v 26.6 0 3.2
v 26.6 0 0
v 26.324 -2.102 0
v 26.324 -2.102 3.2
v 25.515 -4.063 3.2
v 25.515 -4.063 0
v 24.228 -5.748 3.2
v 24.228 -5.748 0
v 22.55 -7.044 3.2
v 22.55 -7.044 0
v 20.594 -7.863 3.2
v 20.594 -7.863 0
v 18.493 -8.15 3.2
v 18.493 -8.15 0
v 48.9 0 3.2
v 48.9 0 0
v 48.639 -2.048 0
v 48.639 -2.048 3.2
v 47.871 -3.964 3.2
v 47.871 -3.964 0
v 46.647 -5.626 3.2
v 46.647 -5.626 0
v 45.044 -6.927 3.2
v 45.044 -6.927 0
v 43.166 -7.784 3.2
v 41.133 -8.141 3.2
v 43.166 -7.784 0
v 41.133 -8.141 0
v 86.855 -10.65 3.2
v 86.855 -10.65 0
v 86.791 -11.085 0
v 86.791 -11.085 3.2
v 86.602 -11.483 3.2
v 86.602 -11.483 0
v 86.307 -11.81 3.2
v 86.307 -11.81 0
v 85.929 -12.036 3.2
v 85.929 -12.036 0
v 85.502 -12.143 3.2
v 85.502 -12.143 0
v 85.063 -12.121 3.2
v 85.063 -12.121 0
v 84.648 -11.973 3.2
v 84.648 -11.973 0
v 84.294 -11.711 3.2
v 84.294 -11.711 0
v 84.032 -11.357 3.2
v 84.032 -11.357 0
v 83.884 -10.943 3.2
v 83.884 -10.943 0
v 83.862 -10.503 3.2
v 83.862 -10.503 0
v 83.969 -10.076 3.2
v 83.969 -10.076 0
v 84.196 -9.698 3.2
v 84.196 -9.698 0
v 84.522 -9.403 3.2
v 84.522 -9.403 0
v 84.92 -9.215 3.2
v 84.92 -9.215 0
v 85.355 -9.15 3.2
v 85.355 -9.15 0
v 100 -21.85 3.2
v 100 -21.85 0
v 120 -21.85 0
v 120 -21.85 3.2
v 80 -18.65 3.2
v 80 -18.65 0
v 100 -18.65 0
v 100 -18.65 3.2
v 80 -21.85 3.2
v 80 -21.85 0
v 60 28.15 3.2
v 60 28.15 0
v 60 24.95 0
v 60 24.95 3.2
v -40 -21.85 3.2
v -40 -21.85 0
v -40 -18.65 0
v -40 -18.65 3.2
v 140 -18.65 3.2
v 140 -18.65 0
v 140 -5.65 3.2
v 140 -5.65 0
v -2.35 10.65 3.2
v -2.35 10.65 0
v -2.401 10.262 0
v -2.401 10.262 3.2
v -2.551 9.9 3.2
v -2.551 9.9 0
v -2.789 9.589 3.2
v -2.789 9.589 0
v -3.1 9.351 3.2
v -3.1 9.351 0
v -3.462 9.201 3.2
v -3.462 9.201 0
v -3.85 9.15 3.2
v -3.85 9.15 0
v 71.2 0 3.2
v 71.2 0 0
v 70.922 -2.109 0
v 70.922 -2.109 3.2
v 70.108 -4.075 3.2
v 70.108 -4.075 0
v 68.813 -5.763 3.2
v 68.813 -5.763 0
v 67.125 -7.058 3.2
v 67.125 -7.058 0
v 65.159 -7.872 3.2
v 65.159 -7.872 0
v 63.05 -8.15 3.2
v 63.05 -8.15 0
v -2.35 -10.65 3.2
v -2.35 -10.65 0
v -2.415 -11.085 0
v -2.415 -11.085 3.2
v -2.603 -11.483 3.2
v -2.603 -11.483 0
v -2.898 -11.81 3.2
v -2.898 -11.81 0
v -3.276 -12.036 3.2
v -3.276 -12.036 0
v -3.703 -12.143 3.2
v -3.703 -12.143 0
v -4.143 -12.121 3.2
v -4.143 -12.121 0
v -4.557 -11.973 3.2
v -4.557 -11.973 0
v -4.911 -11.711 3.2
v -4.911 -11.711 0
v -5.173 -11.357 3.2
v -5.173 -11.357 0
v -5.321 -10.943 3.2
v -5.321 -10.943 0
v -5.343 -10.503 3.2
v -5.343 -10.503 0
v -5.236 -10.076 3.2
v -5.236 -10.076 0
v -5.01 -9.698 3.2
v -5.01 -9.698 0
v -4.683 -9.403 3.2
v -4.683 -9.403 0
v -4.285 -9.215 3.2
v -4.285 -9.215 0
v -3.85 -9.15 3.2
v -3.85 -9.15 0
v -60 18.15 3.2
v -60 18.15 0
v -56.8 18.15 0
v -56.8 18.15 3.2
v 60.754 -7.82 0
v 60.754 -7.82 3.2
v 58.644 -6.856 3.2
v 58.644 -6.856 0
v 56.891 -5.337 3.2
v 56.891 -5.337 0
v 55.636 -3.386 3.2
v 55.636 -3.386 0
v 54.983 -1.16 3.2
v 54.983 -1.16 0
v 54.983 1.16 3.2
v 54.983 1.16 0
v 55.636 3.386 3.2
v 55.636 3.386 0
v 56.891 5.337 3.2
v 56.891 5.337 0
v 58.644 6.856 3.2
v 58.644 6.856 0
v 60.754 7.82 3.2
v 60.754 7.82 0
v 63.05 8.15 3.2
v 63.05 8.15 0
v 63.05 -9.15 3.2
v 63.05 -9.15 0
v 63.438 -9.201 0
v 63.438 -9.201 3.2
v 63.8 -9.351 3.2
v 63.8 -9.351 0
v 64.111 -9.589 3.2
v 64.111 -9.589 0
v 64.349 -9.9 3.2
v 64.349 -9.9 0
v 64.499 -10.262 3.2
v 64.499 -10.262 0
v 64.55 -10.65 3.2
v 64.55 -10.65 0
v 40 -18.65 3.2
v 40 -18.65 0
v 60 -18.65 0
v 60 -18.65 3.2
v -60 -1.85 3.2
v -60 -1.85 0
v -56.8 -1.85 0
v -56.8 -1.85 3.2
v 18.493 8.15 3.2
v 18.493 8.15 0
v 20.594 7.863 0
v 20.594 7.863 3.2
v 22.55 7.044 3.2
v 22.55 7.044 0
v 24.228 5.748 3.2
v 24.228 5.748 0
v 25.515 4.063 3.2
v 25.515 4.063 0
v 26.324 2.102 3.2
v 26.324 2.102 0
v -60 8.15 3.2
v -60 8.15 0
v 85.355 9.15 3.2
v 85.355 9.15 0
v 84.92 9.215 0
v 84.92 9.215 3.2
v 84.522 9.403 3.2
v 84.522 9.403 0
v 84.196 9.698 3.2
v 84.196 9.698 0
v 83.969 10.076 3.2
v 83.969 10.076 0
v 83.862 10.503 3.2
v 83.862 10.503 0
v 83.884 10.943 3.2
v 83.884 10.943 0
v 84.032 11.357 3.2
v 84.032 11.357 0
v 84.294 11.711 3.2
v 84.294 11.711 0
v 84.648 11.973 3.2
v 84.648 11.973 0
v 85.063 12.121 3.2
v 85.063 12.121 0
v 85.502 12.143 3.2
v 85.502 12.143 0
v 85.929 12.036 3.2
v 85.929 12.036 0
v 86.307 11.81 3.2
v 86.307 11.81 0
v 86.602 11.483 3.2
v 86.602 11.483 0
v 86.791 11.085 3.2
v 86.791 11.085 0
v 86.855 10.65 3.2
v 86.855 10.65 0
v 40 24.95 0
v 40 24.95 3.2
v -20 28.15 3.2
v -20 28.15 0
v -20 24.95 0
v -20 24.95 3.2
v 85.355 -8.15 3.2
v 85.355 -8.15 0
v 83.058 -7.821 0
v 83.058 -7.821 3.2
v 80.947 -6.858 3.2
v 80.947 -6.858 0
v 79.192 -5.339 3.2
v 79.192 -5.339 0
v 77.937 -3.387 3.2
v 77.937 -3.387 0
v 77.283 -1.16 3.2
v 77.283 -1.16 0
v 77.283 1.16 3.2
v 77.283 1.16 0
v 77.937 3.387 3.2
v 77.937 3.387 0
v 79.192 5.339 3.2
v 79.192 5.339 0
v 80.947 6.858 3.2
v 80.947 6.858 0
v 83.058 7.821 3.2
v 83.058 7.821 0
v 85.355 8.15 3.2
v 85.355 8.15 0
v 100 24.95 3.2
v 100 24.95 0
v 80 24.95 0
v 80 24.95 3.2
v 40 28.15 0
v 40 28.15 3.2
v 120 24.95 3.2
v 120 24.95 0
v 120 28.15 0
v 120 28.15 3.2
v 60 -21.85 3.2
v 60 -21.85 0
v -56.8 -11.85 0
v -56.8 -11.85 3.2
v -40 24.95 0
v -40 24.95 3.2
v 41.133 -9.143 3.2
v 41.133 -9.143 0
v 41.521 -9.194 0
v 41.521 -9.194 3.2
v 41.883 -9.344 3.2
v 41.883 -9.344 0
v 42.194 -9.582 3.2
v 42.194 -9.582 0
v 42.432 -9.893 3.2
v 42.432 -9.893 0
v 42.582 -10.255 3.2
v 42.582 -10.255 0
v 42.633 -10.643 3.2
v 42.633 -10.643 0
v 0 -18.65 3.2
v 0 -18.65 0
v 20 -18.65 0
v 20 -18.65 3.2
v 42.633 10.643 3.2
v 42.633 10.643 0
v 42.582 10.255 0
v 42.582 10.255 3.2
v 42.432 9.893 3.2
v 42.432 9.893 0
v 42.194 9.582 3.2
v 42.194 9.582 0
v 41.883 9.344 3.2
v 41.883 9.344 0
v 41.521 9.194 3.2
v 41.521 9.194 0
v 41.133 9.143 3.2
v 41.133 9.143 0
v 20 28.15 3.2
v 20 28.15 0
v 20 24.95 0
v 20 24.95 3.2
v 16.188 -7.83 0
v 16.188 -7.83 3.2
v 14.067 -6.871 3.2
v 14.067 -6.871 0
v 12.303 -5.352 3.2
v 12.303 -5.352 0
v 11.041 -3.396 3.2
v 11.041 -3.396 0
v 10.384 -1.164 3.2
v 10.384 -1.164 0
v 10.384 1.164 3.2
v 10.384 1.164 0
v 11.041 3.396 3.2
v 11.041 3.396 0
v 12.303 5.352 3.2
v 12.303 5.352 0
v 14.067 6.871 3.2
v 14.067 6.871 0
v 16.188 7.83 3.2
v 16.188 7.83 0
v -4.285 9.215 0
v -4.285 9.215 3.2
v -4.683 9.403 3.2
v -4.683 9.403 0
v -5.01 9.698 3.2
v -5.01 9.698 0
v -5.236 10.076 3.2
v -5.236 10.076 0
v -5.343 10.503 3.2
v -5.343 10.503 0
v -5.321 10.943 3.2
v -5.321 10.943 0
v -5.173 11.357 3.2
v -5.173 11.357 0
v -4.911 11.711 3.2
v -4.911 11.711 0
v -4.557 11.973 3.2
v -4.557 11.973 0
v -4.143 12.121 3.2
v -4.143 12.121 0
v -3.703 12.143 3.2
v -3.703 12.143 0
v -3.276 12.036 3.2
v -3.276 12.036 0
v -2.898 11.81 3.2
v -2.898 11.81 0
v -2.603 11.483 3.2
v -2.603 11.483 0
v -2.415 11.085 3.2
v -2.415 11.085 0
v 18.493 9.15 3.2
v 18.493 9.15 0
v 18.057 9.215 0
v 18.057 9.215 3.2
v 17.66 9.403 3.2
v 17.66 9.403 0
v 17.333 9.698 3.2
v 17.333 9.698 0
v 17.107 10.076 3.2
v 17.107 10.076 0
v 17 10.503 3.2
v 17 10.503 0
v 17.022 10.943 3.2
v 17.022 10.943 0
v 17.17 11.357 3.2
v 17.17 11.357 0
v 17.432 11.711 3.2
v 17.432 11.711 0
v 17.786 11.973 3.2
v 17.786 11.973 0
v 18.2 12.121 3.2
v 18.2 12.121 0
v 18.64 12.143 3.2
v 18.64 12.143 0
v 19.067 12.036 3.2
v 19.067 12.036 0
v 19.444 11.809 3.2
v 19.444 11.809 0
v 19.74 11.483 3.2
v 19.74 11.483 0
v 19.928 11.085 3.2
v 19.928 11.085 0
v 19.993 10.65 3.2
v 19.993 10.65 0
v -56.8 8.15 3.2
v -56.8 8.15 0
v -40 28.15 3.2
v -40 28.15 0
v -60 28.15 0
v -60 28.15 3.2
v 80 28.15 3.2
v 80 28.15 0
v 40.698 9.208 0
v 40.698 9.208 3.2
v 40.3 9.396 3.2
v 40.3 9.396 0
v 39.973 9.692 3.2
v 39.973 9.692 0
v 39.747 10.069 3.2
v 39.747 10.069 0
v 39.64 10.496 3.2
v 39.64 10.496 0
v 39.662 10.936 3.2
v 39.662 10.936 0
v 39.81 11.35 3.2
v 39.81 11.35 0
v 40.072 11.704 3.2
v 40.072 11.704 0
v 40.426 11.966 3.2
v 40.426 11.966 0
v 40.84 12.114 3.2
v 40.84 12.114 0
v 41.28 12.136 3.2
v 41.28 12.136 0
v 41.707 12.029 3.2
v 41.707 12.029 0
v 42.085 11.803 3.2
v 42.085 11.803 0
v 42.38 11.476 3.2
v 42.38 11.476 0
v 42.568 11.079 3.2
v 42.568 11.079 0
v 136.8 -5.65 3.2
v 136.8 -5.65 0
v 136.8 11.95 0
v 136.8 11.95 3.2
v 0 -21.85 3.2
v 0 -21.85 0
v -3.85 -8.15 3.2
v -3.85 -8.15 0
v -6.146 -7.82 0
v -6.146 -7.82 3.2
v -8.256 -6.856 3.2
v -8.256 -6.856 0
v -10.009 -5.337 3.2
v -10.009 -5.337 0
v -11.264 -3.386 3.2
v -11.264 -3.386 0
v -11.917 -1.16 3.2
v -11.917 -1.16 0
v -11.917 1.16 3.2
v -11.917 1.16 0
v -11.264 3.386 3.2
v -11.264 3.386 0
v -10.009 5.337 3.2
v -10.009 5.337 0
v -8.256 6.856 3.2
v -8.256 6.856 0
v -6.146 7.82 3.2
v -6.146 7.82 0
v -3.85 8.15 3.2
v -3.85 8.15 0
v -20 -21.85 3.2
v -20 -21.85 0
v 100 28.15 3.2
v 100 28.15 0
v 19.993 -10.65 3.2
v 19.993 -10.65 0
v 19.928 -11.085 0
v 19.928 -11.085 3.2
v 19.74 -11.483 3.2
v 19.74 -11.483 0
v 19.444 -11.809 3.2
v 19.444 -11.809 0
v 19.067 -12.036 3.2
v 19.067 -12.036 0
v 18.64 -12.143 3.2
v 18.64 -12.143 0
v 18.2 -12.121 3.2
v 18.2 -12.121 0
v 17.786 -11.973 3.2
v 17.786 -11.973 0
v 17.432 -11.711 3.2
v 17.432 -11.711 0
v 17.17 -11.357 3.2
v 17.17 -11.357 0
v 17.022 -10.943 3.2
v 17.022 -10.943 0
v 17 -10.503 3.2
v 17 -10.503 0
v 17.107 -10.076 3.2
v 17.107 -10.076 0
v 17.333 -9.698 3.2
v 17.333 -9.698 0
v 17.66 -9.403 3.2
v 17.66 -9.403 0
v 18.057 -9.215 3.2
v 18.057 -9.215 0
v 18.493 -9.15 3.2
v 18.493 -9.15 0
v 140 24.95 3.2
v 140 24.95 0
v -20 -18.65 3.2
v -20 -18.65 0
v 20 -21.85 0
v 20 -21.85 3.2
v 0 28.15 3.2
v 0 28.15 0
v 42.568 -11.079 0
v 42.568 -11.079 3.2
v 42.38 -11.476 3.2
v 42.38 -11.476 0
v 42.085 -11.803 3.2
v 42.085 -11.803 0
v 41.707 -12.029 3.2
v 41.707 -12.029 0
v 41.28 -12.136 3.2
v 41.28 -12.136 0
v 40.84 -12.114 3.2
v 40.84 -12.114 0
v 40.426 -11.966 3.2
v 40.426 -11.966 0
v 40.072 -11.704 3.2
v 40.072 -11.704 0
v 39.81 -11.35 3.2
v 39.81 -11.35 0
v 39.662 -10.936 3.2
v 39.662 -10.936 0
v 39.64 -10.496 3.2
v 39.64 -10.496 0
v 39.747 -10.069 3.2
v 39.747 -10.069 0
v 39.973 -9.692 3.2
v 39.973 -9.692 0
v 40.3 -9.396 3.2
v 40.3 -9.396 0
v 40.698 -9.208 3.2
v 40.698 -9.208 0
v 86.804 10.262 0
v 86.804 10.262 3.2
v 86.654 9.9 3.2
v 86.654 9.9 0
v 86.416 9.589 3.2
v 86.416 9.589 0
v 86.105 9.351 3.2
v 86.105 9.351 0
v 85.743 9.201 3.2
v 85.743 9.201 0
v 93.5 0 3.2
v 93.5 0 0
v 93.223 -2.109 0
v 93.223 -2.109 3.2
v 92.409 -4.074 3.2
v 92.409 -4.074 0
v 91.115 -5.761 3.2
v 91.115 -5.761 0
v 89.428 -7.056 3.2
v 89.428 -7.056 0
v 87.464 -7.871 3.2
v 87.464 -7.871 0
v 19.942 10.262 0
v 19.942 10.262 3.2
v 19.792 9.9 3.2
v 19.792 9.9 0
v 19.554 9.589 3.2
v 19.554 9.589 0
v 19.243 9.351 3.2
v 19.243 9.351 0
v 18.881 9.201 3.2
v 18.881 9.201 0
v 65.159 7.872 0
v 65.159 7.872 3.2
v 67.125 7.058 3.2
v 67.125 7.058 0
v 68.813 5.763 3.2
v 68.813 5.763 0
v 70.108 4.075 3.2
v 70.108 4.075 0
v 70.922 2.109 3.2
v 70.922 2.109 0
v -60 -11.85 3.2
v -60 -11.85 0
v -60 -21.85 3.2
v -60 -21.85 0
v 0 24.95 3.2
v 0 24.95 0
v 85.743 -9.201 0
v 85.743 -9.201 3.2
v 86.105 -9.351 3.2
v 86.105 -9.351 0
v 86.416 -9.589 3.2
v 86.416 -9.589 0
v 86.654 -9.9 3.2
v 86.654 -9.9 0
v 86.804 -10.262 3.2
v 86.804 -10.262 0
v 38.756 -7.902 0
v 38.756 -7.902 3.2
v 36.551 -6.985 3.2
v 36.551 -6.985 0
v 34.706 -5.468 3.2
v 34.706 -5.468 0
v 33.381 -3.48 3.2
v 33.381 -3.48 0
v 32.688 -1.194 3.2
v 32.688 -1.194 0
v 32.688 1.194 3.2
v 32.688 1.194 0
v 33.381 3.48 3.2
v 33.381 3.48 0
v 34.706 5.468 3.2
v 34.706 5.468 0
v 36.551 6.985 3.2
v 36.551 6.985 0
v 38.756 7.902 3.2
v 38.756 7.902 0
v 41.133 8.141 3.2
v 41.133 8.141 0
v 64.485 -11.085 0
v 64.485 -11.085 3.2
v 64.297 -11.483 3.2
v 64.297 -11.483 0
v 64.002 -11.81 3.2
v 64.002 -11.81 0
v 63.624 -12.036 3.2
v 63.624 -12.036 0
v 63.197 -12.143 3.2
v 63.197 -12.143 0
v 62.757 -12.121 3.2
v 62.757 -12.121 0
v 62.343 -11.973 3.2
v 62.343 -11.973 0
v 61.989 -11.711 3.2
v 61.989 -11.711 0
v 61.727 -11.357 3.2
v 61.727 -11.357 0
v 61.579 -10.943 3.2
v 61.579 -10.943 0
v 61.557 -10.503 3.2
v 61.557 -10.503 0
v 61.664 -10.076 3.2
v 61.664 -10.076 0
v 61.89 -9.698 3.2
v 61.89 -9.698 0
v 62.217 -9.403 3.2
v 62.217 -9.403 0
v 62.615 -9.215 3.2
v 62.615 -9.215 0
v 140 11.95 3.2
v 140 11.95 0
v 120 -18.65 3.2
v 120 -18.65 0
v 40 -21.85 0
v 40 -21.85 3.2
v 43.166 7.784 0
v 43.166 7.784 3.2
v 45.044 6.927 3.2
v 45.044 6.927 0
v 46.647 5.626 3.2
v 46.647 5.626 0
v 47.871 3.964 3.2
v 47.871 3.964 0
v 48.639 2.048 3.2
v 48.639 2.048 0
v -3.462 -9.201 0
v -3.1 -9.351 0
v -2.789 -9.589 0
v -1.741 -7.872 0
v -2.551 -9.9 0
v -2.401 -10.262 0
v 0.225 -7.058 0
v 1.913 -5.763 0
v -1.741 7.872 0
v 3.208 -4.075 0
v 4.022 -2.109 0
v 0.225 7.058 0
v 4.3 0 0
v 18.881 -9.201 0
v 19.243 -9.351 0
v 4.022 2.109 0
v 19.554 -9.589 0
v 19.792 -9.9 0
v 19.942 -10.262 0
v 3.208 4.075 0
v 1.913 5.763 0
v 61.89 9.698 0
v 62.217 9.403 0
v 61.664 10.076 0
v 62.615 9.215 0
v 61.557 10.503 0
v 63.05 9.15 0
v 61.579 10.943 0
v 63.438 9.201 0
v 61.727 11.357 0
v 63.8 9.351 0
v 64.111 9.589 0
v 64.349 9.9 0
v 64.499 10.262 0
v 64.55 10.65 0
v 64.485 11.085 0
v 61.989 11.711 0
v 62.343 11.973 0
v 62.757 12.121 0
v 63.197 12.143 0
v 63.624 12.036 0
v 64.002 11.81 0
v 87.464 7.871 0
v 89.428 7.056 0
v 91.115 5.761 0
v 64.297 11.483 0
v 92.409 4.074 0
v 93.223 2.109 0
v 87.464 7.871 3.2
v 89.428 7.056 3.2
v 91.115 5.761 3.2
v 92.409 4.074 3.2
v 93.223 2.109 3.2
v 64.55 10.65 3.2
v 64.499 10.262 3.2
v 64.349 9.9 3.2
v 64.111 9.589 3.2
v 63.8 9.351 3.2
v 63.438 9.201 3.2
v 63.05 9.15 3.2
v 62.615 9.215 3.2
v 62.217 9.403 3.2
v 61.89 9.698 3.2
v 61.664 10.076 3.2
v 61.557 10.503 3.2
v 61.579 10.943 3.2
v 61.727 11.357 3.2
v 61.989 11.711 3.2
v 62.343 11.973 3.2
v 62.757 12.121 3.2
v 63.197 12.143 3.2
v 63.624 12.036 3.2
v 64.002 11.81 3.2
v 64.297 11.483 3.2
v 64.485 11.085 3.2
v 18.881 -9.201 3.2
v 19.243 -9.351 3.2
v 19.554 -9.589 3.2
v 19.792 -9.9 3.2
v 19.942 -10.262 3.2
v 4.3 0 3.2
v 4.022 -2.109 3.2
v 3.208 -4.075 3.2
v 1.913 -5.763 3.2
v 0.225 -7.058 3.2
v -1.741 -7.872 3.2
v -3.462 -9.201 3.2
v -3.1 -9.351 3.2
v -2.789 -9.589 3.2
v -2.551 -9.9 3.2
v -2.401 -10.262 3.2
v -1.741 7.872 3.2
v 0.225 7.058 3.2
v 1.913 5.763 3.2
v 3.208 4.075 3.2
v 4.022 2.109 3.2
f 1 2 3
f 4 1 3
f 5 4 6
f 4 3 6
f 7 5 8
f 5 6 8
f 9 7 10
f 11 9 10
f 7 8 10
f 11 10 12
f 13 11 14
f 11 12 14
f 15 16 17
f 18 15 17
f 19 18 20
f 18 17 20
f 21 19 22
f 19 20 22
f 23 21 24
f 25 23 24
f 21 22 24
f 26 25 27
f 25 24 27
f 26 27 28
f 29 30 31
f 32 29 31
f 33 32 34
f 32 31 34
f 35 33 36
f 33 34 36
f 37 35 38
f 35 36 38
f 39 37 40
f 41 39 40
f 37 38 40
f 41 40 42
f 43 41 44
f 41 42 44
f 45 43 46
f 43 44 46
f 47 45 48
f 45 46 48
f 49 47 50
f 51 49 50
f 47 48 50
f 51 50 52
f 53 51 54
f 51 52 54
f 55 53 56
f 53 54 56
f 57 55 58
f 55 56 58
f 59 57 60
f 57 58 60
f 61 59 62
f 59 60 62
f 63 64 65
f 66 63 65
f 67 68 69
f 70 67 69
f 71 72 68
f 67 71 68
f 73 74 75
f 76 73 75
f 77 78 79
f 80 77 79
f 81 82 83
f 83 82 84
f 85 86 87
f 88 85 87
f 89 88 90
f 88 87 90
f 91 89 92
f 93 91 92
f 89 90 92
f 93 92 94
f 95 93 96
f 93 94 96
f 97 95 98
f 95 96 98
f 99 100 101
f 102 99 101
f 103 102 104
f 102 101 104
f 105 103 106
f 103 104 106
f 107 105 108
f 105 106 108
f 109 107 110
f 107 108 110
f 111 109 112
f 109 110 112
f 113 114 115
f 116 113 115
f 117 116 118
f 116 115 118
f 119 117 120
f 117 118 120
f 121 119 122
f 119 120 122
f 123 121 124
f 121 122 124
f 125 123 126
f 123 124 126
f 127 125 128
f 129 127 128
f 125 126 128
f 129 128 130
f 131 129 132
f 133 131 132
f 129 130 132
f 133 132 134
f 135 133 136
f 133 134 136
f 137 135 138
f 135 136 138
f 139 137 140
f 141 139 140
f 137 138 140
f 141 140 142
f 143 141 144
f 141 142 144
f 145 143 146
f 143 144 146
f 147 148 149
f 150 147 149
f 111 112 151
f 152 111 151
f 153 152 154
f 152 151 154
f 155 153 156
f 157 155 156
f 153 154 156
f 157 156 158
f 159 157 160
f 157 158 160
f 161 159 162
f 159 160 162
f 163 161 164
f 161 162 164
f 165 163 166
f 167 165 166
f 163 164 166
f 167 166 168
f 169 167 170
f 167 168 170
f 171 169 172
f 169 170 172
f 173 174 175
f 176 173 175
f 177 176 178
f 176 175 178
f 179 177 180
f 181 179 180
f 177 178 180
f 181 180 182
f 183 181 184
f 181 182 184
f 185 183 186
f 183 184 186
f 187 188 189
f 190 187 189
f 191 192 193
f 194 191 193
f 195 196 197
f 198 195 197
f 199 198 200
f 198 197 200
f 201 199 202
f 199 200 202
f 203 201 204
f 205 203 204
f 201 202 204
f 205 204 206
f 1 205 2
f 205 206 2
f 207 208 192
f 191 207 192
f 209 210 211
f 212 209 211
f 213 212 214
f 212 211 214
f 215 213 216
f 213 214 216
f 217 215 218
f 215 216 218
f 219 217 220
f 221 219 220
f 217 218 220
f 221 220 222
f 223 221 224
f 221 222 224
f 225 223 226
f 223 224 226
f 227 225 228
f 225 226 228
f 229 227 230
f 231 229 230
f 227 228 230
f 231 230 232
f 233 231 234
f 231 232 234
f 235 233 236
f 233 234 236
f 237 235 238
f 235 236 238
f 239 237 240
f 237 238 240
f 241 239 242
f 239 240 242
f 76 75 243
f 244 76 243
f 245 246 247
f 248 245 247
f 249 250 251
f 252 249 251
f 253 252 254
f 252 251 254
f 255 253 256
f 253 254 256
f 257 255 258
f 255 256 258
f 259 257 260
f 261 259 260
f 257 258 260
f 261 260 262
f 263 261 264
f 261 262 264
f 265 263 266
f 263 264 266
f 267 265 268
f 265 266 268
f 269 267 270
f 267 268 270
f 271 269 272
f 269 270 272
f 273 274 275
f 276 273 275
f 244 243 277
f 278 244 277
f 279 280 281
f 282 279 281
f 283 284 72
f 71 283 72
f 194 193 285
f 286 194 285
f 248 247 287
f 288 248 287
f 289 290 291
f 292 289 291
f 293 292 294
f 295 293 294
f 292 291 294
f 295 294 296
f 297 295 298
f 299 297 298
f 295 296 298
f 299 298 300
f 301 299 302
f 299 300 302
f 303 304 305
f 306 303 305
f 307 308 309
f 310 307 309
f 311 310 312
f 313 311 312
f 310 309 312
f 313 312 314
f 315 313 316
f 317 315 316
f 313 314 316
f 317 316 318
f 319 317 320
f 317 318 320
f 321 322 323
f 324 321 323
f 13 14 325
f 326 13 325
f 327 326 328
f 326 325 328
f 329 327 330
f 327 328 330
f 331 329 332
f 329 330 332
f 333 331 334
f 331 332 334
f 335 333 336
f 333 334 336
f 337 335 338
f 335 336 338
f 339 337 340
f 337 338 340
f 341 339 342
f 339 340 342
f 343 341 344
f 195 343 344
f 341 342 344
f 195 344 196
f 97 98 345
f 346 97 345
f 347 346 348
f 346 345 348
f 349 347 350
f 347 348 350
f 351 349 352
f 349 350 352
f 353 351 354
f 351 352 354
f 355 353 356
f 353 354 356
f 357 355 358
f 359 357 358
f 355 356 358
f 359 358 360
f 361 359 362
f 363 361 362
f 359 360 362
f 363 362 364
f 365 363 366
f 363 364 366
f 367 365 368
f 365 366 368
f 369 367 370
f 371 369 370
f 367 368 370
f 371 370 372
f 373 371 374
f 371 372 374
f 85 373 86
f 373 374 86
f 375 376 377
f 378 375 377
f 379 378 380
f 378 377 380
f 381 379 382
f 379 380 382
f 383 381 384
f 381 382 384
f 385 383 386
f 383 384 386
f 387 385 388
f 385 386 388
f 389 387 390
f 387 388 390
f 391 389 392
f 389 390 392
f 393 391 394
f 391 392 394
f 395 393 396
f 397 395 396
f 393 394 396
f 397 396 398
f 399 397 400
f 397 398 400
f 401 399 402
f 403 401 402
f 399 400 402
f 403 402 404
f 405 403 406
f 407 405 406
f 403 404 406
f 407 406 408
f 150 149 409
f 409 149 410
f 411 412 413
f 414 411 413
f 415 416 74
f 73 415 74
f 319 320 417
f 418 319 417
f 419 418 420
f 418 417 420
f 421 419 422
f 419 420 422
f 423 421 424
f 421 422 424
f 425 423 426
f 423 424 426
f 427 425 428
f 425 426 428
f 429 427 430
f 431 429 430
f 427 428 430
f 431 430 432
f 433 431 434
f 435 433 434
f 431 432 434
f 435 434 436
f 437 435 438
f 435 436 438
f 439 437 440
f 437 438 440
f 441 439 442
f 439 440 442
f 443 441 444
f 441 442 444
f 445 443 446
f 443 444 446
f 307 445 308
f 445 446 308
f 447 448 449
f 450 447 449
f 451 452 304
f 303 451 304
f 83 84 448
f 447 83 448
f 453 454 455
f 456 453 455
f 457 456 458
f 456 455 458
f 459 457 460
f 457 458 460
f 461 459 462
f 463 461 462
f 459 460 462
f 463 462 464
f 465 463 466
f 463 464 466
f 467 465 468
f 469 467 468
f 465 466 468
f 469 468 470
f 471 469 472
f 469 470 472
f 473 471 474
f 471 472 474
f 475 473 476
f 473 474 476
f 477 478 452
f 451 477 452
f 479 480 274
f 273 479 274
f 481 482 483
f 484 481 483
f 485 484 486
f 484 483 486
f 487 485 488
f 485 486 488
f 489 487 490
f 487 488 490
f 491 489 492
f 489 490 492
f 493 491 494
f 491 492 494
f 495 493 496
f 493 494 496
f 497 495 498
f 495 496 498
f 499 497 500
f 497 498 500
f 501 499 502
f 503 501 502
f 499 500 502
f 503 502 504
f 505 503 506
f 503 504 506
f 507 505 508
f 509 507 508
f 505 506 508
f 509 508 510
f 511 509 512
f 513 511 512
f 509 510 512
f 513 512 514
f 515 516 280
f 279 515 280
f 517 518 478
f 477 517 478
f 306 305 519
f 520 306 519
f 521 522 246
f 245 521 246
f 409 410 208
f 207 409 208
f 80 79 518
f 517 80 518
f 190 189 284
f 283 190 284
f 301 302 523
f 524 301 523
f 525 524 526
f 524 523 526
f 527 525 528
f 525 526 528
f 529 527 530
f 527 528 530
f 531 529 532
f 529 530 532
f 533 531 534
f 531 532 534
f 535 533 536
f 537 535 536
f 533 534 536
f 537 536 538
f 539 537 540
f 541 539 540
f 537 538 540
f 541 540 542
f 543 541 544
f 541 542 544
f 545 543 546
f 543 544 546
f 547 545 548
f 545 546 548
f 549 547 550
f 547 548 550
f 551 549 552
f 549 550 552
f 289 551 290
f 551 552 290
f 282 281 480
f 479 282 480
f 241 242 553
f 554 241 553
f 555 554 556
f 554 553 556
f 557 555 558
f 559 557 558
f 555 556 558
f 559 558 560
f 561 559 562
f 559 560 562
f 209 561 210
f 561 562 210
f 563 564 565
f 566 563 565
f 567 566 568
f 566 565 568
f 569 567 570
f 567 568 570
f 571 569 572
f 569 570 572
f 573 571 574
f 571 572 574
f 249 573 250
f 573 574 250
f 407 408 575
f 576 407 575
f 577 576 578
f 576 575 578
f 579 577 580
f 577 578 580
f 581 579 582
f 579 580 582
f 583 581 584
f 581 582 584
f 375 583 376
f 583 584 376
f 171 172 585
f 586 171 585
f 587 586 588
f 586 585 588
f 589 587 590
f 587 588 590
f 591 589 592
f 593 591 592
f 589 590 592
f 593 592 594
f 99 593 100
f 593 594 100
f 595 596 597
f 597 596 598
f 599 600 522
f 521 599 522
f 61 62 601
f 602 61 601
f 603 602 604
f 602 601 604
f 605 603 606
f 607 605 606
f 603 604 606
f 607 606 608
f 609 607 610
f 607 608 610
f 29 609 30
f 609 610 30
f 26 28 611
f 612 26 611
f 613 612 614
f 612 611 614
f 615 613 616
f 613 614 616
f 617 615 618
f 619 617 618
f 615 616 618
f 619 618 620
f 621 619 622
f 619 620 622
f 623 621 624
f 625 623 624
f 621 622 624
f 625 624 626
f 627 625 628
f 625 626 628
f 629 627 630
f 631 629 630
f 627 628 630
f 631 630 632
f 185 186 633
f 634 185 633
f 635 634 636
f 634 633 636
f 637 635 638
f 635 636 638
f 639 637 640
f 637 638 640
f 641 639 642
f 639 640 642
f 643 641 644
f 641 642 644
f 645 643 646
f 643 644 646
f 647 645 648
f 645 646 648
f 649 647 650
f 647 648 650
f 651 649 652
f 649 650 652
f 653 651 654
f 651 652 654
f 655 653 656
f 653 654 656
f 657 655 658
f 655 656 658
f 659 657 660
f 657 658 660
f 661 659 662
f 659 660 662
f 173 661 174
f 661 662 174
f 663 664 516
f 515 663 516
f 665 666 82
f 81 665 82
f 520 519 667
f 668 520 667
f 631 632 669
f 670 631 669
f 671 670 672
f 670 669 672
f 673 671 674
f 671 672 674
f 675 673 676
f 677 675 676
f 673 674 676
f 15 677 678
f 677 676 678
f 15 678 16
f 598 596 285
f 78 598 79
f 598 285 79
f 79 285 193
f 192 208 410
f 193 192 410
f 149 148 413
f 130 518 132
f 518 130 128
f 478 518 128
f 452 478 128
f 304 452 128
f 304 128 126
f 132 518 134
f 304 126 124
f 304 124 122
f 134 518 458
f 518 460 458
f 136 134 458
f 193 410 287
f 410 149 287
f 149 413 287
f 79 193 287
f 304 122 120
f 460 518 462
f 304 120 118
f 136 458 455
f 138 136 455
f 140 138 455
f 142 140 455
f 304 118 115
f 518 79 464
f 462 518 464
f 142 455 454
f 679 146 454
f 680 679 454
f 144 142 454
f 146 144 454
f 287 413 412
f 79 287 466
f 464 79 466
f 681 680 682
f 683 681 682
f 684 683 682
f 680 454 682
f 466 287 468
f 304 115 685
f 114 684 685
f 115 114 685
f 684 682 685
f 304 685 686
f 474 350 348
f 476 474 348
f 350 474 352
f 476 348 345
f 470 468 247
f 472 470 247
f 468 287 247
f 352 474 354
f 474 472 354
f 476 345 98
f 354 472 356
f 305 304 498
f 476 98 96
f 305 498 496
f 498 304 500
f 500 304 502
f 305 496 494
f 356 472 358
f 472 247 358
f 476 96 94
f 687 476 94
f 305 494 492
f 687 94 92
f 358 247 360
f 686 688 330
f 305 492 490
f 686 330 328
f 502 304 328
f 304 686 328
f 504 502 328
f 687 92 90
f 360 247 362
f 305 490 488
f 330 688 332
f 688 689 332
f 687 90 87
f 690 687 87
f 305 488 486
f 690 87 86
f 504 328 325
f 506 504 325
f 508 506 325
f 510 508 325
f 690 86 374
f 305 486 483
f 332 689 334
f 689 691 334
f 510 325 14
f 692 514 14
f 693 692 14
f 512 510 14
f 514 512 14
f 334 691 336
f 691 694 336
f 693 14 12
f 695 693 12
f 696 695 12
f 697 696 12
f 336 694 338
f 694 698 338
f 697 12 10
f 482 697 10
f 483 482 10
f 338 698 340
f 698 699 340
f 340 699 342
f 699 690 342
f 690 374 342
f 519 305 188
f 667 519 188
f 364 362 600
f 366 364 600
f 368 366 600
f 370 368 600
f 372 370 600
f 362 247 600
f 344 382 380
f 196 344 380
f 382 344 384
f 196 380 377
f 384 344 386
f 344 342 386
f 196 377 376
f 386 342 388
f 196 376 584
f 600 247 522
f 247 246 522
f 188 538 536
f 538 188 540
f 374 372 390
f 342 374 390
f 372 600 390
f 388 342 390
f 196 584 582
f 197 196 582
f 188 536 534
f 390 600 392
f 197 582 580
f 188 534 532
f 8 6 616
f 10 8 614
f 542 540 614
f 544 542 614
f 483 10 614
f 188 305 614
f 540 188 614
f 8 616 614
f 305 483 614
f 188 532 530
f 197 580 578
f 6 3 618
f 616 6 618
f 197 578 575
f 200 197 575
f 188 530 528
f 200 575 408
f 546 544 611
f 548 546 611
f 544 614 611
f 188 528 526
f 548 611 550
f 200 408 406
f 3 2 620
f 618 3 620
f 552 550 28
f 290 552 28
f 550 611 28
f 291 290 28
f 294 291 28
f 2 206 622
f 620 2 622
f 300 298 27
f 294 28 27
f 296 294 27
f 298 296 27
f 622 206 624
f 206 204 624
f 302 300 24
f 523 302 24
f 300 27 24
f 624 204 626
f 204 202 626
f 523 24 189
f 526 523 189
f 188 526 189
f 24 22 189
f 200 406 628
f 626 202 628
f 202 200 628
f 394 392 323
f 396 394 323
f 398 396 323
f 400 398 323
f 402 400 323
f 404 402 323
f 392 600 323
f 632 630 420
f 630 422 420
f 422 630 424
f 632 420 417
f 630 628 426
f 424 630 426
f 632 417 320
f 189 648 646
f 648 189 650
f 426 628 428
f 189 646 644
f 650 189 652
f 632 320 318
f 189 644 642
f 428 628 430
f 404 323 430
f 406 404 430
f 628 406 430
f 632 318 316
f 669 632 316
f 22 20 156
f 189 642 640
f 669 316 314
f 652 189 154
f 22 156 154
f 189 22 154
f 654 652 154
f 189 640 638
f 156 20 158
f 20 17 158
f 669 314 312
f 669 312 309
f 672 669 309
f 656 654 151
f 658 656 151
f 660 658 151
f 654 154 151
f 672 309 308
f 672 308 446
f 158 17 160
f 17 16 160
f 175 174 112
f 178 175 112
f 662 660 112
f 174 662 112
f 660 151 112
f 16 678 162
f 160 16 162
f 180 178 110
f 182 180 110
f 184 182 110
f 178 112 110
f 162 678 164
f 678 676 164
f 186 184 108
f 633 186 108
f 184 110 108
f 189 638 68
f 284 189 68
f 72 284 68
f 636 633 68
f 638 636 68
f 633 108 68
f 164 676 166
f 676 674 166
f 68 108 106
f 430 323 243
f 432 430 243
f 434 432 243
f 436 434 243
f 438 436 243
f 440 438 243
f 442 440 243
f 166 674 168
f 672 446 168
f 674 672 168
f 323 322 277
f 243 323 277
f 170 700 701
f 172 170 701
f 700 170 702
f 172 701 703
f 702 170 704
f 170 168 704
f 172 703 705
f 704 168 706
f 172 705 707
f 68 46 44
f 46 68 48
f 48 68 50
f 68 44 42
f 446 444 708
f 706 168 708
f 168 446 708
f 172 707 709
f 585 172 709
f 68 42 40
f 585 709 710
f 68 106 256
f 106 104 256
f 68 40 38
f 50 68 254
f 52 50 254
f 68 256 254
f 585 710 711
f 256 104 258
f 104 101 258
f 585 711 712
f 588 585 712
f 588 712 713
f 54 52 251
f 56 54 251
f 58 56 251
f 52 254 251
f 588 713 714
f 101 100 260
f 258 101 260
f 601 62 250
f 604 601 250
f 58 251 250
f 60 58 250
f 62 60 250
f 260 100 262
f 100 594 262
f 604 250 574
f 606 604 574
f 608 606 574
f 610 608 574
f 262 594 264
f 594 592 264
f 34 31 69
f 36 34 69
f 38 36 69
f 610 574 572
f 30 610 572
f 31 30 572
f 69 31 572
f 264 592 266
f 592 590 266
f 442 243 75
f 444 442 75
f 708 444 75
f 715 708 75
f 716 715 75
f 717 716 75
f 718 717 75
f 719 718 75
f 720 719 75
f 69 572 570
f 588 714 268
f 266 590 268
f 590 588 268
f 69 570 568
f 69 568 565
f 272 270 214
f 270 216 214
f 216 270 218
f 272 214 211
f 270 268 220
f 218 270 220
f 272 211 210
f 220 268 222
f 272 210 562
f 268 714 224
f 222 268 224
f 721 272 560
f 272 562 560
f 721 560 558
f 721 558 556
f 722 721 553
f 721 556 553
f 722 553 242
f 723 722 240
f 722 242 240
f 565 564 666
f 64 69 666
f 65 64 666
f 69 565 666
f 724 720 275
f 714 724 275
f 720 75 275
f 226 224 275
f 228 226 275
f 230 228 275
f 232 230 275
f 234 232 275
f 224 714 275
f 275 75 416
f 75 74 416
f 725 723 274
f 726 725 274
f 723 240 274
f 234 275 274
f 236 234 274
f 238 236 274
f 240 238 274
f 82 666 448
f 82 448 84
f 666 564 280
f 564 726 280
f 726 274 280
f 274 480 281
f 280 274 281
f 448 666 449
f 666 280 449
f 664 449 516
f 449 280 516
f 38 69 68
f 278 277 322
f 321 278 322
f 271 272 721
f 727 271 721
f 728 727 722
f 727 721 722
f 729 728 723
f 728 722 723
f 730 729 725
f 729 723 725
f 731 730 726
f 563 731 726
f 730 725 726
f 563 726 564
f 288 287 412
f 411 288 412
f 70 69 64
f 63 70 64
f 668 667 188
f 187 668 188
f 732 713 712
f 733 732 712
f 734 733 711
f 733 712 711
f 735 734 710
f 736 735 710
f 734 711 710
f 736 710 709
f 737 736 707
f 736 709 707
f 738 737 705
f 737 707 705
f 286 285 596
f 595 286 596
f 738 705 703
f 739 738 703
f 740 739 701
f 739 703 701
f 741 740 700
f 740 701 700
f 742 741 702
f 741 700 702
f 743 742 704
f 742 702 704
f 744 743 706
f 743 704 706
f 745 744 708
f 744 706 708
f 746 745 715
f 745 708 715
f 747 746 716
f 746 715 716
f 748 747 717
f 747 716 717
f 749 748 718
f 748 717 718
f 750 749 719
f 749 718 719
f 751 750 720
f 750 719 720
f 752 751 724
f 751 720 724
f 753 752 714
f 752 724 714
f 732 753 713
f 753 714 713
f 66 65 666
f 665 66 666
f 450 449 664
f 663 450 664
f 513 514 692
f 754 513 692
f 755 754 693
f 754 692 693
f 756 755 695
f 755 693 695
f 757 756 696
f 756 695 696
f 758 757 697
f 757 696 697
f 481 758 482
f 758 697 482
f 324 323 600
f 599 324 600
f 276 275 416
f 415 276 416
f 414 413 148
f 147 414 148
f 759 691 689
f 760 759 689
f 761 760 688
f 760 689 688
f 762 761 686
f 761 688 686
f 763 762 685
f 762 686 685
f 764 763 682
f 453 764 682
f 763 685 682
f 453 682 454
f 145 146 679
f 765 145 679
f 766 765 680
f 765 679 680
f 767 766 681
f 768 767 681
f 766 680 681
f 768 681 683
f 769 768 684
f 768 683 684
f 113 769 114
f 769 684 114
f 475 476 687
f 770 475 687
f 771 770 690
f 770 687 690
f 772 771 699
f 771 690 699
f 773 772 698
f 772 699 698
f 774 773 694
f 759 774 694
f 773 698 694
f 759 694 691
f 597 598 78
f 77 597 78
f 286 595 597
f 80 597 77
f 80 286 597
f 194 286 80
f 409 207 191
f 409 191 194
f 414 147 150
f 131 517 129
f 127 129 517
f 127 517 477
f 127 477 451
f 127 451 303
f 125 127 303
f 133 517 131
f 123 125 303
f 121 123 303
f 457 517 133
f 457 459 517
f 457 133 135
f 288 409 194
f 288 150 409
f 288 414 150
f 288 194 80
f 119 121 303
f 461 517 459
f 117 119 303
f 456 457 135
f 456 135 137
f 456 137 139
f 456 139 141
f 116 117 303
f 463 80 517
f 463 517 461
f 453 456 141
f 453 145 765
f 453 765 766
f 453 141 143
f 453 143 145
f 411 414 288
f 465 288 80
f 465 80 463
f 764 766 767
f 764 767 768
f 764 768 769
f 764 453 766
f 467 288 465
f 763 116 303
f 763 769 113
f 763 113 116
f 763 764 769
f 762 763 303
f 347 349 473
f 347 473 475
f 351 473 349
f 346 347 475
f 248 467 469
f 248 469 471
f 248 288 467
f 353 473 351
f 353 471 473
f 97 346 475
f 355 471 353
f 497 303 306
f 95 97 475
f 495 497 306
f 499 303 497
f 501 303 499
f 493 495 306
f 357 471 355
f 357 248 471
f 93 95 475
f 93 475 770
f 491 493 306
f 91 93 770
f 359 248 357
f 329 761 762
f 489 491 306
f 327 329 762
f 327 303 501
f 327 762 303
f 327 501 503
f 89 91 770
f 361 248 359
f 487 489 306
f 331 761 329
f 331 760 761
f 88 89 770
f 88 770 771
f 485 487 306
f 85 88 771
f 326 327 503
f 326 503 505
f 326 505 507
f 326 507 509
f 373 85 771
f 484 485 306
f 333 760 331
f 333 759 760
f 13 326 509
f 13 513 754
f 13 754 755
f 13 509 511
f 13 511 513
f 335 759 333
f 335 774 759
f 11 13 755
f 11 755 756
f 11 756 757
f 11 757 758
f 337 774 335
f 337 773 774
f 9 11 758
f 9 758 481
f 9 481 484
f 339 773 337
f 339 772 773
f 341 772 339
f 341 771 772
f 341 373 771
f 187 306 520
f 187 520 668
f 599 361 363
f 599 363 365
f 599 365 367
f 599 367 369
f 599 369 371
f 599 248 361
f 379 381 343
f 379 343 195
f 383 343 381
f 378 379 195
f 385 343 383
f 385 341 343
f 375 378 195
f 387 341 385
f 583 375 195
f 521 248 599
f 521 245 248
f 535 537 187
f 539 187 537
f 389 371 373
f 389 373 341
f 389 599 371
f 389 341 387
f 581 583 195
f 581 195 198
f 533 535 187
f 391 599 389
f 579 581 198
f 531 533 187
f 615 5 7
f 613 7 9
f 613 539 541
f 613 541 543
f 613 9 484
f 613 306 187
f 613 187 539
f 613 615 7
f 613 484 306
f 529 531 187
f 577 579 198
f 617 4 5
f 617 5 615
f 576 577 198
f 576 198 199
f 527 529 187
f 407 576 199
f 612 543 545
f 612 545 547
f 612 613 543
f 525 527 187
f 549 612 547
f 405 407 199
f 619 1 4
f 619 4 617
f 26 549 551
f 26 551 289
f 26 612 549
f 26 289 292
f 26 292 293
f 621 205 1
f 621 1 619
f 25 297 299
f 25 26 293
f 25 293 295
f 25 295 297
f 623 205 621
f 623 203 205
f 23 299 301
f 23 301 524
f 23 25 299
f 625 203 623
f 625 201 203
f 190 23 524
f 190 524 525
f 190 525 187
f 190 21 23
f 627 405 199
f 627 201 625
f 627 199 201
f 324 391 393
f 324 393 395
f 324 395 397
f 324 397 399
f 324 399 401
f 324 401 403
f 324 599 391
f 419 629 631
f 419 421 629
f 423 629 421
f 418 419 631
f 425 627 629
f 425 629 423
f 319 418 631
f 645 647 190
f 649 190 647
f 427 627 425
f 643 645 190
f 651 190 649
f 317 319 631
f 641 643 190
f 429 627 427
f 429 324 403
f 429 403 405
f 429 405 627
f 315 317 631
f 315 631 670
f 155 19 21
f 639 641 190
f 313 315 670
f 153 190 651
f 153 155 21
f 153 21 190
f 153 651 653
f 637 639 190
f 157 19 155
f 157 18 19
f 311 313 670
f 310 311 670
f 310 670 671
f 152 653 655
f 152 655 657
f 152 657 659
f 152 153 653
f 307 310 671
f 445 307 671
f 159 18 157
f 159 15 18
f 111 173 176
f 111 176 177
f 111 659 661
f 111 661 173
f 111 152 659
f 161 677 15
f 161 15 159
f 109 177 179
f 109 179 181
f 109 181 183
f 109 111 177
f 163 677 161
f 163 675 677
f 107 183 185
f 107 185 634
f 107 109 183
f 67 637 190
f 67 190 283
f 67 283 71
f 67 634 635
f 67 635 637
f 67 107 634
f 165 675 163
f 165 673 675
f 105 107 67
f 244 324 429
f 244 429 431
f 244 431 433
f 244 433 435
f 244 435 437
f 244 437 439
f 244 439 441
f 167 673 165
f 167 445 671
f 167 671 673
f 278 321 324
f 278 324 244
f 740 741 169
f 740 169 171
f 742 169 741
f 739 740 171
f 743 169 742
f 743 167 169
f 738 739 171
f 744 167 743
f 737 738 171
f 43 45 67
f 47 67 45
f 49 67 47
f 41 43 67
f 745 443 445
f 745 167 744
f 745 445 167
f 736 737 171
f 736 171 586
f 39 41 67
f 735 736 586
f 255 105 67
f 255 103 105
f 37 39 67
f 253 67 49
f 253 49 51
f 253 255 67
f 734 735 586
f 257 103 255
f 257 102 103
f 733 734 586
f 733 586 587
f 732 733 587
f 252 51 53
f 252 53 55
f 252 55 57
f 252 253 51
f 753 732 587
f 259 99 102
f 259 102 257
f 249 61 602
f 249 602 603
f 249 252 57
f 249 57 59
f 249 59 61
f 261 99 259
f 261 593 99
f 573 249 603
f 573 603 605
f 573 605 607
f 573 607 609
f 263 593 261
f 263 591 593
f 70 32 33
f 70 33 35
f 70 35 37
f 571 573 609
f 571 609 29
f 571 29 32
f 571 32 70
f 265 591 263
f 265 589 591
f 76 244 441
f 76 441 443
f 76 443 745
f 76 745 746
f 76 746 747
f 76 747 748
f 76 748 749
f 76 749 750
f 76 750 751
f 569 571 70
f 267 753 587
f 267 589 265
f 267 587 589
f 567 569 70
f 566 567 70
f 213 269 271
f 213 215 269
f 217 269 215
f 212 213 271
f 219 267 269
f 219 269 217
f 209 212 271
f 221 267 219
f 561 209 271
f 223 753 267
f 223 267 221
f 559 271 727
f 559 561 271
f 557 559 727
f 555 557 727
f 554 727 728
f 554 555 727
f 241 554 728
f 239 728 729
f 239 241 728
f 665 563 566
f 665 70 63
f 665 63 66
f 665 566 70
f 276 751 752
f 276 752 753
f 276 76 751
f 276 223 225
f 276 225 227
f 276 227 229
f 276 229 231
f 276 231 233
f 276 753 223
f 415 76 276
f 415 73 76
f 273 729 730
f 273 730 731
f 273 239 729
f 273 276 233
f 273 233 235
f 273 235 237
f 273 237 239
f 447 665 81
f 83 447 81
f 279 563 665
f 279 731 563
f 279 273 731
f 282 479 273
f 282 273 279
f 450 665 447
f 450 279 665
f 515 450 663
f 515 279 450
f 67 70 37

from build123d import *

# Parameters (mm, degrees)
F1_DEPTH = 3.2


with BuildPart() as f1:
    # F0 (on Top) → F1 (new body)
    with BuildSketch(Plane.XY):
        Polygon((-40, 28.15), (-60, 28.15), (-60, 18.15), (-56.8, 18.15), (-56.8, 8.15), (-60, 8.15), (-60, -1.85), (-56.8, -1.85), (-56.8, -11.85), (-60, -11.85), (-60, -21.85), (-40, -21.85), (-40, -18.65), (-20, -18.65), (-20, -21.85), (0, -21.85), (0, -18.65), (20, -18.65), (20, -21.85), (40, -21.85), (40, -18.65), (60, -18.65), (60, -21.85), (80, -21.85), (80, -18.65), (100, -18.65), (100, -21.85), (120, -21.85), (120, -18.65), (140, -18.65), (140, -5.65), (136.8, -5.65), (136.8, 11.95), (140, 11.95), (140, 24.95), (120, 24.95), (120, 28.15), (100, 28.15), (100, 24.95), (80, 24.95), (80, 28.15), (60, 28.15), (60, 24.95), (40, 24.95), (40, 28.15), (20, 28.15), (20, 24.95), (0, 24.95), (0, 28.15), (-20, 28.15), (-20, 24.95), (-40, 24.95), align=None)
        with BuildLine():
            ThreePointArc((-2.35, -10.65), (-4.9106601718, -11.7106601718), (-3.85, -9.15))
            ThreePointArc((-3.85, -9.15), (-2.7893398282, -9.5893398282), (-2.35, -10.65))
        make_face(mode=Mode.SUBTRACT)
        with BuildLine():
            ThreePointArc((19.9928815383, -10.6499136698), (17.4322213665, -11.7105738416), (18.4928815383, -9.1499136698))
            ThreePointArc((18.4928815383, -9.1499136698), (19.55354171, -9.589253498), (19.9928815383, -10.6499136698))
        make_face(mode=Mode.SUBTRACT)
        with BuildLine():
            ThreePointArc((-3.85, 8.15), (1.9129202667, 5.7629202667), (4.3, 0))
            ThreePointArc((4.3, 0), (1.9129202667, -5.7629202667), (-3.85, -8.15))
            ThreePointArc((-3.85, -8.15), (-12, 0), (-3.85, 8.15))
        make_face(mode=Mode.SUBTRACT)
        with BuildLine():
            ThreePointArc((18.4928815383, 8.1498871878), (24.2280612898, 5.7477393584), (26.6, 0))
            ThreePointArc((26.6, 0), (24.2280612898, -5.7477393584), (18.4928815383, -8.1498871878))
            ThreePointArc((18.4928815383, -8.1498871878), (10.3, 0), (18.4928815383, 8.1498871878))
        make_face(mode=Mode.SUBTRACT)
        with BuildLine():
            ThreePointArc((42.6330092816, -10.6431106304), (40.0723491098, -11.7037708021), (41.1330092816, -9.1431106304))
            ThreePointArc((41.1330092816, -9.1431106304), (42.1936694534, -9.5824504586), (42.6330092816, -10.6431106304))
        make_face(mode=Mode.SUBTRACT)
        with BuildLine():
            ThreePointArc((64.55, -10.65), (61.9893398282, -11.7106601718), (63.05, -9.15))
            ThreePointArc((63.05, -9.15), (64.1106601718, -9.5893398282), (64.55, -10.65))
        make_face(mode=Mode.SUBTRACT)
        with BuildLine():
            ThreePointArc((86.8551553416, -10.6499987522), (84.2944951698, -11.710658924), (85.3551553416, -9.1499987522))
            ThreePointArc((85.3551553416, -9.1499987522), (86.4158155134, -9.5893385804), (86.8551553416, -10.6499987522))
        make_face(mode=Mode.SUBTRACT)
        with BuildLine():
            ThreePointArc((41.1330092816, 8.1409952641), (46.6467798689, 5.6258765697), (48.9, 0))
            ThreePointArc((48.9, 0), (46.6467798689, -5.6258765697), (41.1330092816, -8.1409952641))
            ThreePointArc((41.1330092816, -8.1409952641), (32.6, 0), (41.1330092816, 8.1409952641))
        make_face(mode=Mode.SUBTRACT)
        with BuildLine():
            ThreePointArc((63.05, 8.15), (68.8129202667, 5.7629202667), (71.2, 0))
            ThreePointArc((71.2, 0), (68.8129202667, -5.7629202667), (63.05, -8.15))
            ThreePointArc((63.05, -8.15), (54.9, 0), (63.05, 8.15))
        make_face(mode=Mode.SUBTRACT)
        with BuildLine():
            ThreePointArc((85.3551553416, 8.1499983695), (91.114742667, 5.7610972898), (93.5, 0))
            ThreePointArc((93.5, 0), (91.114742667, -5.7610972898), (85.3551553416, -8.1499983695))
            ThreePointArc((85.3551553416, -8.1499983695), (77.2, 0), (85.3551553416, 8.1499983695))
        make_face(mode=Mode.SUBTRACT)
        with BuildLine():
            ThreePointArc((-2.35, 10.65), (-2.7893398282, 9.5893398282), (-3.85, 9.15))
            ThreePointArc((-3.85, 9.15), (-4.9106601718, 11.7106601718), (-2.35, 10.65))
        make_face(mode=Mode.SUBTRACT)
        with BuildLine():
            ThreePointArc((19.9928815383, 10.6499136698), (19.55354171, 9.589253498), (18.4928815383, 9.1499136698))
            ThreePointArc((18.4928815383, 9.1499136698), (17.4322213665, 11.7105738416), (19.9928815383, 10.6499136698))
        make_face(mode=Mode.SUBTRACT)
        with BuildLine():
            ThreePointArc((42.6330092816, 10.6431106304), (42.1936694534, 9.5824504586), (41.1330092816, 9.1431106304))
            ThreePointArc((41.1330092816, 9.1431106304), (40.0723491098, 11.7037708021), (42.6330092816, 10.6431106304))
        make_face(mode=Mode.SUBTRACT)
        with BuildLine():
            ThreePointArc((64.55, 10.65), (64.1106601718, 9.5893398282), (63.05, 9.15))
            ThreePointArc((63.05, 9.15), (61.9893398282, 11.7106601718), (64.55, 10.65))
        make_face(mode=Mode.SUBTRACT)
        with BuildLine():
            ThreePointArc((86.8551553416, 10.6499987522), (86.4158155134, 9.5893385804), (85.3551553416, 9.1499987522))
            ThreePointArc((85.3551553416, 9.1499987522), (84.2944951698, 11.710658924), (86.8551553416, 10.6499987522))
        make_face(mode=Mode.SUBTRACT)
    extrude(amount=F1_DEPTH)


solid = f1.part
